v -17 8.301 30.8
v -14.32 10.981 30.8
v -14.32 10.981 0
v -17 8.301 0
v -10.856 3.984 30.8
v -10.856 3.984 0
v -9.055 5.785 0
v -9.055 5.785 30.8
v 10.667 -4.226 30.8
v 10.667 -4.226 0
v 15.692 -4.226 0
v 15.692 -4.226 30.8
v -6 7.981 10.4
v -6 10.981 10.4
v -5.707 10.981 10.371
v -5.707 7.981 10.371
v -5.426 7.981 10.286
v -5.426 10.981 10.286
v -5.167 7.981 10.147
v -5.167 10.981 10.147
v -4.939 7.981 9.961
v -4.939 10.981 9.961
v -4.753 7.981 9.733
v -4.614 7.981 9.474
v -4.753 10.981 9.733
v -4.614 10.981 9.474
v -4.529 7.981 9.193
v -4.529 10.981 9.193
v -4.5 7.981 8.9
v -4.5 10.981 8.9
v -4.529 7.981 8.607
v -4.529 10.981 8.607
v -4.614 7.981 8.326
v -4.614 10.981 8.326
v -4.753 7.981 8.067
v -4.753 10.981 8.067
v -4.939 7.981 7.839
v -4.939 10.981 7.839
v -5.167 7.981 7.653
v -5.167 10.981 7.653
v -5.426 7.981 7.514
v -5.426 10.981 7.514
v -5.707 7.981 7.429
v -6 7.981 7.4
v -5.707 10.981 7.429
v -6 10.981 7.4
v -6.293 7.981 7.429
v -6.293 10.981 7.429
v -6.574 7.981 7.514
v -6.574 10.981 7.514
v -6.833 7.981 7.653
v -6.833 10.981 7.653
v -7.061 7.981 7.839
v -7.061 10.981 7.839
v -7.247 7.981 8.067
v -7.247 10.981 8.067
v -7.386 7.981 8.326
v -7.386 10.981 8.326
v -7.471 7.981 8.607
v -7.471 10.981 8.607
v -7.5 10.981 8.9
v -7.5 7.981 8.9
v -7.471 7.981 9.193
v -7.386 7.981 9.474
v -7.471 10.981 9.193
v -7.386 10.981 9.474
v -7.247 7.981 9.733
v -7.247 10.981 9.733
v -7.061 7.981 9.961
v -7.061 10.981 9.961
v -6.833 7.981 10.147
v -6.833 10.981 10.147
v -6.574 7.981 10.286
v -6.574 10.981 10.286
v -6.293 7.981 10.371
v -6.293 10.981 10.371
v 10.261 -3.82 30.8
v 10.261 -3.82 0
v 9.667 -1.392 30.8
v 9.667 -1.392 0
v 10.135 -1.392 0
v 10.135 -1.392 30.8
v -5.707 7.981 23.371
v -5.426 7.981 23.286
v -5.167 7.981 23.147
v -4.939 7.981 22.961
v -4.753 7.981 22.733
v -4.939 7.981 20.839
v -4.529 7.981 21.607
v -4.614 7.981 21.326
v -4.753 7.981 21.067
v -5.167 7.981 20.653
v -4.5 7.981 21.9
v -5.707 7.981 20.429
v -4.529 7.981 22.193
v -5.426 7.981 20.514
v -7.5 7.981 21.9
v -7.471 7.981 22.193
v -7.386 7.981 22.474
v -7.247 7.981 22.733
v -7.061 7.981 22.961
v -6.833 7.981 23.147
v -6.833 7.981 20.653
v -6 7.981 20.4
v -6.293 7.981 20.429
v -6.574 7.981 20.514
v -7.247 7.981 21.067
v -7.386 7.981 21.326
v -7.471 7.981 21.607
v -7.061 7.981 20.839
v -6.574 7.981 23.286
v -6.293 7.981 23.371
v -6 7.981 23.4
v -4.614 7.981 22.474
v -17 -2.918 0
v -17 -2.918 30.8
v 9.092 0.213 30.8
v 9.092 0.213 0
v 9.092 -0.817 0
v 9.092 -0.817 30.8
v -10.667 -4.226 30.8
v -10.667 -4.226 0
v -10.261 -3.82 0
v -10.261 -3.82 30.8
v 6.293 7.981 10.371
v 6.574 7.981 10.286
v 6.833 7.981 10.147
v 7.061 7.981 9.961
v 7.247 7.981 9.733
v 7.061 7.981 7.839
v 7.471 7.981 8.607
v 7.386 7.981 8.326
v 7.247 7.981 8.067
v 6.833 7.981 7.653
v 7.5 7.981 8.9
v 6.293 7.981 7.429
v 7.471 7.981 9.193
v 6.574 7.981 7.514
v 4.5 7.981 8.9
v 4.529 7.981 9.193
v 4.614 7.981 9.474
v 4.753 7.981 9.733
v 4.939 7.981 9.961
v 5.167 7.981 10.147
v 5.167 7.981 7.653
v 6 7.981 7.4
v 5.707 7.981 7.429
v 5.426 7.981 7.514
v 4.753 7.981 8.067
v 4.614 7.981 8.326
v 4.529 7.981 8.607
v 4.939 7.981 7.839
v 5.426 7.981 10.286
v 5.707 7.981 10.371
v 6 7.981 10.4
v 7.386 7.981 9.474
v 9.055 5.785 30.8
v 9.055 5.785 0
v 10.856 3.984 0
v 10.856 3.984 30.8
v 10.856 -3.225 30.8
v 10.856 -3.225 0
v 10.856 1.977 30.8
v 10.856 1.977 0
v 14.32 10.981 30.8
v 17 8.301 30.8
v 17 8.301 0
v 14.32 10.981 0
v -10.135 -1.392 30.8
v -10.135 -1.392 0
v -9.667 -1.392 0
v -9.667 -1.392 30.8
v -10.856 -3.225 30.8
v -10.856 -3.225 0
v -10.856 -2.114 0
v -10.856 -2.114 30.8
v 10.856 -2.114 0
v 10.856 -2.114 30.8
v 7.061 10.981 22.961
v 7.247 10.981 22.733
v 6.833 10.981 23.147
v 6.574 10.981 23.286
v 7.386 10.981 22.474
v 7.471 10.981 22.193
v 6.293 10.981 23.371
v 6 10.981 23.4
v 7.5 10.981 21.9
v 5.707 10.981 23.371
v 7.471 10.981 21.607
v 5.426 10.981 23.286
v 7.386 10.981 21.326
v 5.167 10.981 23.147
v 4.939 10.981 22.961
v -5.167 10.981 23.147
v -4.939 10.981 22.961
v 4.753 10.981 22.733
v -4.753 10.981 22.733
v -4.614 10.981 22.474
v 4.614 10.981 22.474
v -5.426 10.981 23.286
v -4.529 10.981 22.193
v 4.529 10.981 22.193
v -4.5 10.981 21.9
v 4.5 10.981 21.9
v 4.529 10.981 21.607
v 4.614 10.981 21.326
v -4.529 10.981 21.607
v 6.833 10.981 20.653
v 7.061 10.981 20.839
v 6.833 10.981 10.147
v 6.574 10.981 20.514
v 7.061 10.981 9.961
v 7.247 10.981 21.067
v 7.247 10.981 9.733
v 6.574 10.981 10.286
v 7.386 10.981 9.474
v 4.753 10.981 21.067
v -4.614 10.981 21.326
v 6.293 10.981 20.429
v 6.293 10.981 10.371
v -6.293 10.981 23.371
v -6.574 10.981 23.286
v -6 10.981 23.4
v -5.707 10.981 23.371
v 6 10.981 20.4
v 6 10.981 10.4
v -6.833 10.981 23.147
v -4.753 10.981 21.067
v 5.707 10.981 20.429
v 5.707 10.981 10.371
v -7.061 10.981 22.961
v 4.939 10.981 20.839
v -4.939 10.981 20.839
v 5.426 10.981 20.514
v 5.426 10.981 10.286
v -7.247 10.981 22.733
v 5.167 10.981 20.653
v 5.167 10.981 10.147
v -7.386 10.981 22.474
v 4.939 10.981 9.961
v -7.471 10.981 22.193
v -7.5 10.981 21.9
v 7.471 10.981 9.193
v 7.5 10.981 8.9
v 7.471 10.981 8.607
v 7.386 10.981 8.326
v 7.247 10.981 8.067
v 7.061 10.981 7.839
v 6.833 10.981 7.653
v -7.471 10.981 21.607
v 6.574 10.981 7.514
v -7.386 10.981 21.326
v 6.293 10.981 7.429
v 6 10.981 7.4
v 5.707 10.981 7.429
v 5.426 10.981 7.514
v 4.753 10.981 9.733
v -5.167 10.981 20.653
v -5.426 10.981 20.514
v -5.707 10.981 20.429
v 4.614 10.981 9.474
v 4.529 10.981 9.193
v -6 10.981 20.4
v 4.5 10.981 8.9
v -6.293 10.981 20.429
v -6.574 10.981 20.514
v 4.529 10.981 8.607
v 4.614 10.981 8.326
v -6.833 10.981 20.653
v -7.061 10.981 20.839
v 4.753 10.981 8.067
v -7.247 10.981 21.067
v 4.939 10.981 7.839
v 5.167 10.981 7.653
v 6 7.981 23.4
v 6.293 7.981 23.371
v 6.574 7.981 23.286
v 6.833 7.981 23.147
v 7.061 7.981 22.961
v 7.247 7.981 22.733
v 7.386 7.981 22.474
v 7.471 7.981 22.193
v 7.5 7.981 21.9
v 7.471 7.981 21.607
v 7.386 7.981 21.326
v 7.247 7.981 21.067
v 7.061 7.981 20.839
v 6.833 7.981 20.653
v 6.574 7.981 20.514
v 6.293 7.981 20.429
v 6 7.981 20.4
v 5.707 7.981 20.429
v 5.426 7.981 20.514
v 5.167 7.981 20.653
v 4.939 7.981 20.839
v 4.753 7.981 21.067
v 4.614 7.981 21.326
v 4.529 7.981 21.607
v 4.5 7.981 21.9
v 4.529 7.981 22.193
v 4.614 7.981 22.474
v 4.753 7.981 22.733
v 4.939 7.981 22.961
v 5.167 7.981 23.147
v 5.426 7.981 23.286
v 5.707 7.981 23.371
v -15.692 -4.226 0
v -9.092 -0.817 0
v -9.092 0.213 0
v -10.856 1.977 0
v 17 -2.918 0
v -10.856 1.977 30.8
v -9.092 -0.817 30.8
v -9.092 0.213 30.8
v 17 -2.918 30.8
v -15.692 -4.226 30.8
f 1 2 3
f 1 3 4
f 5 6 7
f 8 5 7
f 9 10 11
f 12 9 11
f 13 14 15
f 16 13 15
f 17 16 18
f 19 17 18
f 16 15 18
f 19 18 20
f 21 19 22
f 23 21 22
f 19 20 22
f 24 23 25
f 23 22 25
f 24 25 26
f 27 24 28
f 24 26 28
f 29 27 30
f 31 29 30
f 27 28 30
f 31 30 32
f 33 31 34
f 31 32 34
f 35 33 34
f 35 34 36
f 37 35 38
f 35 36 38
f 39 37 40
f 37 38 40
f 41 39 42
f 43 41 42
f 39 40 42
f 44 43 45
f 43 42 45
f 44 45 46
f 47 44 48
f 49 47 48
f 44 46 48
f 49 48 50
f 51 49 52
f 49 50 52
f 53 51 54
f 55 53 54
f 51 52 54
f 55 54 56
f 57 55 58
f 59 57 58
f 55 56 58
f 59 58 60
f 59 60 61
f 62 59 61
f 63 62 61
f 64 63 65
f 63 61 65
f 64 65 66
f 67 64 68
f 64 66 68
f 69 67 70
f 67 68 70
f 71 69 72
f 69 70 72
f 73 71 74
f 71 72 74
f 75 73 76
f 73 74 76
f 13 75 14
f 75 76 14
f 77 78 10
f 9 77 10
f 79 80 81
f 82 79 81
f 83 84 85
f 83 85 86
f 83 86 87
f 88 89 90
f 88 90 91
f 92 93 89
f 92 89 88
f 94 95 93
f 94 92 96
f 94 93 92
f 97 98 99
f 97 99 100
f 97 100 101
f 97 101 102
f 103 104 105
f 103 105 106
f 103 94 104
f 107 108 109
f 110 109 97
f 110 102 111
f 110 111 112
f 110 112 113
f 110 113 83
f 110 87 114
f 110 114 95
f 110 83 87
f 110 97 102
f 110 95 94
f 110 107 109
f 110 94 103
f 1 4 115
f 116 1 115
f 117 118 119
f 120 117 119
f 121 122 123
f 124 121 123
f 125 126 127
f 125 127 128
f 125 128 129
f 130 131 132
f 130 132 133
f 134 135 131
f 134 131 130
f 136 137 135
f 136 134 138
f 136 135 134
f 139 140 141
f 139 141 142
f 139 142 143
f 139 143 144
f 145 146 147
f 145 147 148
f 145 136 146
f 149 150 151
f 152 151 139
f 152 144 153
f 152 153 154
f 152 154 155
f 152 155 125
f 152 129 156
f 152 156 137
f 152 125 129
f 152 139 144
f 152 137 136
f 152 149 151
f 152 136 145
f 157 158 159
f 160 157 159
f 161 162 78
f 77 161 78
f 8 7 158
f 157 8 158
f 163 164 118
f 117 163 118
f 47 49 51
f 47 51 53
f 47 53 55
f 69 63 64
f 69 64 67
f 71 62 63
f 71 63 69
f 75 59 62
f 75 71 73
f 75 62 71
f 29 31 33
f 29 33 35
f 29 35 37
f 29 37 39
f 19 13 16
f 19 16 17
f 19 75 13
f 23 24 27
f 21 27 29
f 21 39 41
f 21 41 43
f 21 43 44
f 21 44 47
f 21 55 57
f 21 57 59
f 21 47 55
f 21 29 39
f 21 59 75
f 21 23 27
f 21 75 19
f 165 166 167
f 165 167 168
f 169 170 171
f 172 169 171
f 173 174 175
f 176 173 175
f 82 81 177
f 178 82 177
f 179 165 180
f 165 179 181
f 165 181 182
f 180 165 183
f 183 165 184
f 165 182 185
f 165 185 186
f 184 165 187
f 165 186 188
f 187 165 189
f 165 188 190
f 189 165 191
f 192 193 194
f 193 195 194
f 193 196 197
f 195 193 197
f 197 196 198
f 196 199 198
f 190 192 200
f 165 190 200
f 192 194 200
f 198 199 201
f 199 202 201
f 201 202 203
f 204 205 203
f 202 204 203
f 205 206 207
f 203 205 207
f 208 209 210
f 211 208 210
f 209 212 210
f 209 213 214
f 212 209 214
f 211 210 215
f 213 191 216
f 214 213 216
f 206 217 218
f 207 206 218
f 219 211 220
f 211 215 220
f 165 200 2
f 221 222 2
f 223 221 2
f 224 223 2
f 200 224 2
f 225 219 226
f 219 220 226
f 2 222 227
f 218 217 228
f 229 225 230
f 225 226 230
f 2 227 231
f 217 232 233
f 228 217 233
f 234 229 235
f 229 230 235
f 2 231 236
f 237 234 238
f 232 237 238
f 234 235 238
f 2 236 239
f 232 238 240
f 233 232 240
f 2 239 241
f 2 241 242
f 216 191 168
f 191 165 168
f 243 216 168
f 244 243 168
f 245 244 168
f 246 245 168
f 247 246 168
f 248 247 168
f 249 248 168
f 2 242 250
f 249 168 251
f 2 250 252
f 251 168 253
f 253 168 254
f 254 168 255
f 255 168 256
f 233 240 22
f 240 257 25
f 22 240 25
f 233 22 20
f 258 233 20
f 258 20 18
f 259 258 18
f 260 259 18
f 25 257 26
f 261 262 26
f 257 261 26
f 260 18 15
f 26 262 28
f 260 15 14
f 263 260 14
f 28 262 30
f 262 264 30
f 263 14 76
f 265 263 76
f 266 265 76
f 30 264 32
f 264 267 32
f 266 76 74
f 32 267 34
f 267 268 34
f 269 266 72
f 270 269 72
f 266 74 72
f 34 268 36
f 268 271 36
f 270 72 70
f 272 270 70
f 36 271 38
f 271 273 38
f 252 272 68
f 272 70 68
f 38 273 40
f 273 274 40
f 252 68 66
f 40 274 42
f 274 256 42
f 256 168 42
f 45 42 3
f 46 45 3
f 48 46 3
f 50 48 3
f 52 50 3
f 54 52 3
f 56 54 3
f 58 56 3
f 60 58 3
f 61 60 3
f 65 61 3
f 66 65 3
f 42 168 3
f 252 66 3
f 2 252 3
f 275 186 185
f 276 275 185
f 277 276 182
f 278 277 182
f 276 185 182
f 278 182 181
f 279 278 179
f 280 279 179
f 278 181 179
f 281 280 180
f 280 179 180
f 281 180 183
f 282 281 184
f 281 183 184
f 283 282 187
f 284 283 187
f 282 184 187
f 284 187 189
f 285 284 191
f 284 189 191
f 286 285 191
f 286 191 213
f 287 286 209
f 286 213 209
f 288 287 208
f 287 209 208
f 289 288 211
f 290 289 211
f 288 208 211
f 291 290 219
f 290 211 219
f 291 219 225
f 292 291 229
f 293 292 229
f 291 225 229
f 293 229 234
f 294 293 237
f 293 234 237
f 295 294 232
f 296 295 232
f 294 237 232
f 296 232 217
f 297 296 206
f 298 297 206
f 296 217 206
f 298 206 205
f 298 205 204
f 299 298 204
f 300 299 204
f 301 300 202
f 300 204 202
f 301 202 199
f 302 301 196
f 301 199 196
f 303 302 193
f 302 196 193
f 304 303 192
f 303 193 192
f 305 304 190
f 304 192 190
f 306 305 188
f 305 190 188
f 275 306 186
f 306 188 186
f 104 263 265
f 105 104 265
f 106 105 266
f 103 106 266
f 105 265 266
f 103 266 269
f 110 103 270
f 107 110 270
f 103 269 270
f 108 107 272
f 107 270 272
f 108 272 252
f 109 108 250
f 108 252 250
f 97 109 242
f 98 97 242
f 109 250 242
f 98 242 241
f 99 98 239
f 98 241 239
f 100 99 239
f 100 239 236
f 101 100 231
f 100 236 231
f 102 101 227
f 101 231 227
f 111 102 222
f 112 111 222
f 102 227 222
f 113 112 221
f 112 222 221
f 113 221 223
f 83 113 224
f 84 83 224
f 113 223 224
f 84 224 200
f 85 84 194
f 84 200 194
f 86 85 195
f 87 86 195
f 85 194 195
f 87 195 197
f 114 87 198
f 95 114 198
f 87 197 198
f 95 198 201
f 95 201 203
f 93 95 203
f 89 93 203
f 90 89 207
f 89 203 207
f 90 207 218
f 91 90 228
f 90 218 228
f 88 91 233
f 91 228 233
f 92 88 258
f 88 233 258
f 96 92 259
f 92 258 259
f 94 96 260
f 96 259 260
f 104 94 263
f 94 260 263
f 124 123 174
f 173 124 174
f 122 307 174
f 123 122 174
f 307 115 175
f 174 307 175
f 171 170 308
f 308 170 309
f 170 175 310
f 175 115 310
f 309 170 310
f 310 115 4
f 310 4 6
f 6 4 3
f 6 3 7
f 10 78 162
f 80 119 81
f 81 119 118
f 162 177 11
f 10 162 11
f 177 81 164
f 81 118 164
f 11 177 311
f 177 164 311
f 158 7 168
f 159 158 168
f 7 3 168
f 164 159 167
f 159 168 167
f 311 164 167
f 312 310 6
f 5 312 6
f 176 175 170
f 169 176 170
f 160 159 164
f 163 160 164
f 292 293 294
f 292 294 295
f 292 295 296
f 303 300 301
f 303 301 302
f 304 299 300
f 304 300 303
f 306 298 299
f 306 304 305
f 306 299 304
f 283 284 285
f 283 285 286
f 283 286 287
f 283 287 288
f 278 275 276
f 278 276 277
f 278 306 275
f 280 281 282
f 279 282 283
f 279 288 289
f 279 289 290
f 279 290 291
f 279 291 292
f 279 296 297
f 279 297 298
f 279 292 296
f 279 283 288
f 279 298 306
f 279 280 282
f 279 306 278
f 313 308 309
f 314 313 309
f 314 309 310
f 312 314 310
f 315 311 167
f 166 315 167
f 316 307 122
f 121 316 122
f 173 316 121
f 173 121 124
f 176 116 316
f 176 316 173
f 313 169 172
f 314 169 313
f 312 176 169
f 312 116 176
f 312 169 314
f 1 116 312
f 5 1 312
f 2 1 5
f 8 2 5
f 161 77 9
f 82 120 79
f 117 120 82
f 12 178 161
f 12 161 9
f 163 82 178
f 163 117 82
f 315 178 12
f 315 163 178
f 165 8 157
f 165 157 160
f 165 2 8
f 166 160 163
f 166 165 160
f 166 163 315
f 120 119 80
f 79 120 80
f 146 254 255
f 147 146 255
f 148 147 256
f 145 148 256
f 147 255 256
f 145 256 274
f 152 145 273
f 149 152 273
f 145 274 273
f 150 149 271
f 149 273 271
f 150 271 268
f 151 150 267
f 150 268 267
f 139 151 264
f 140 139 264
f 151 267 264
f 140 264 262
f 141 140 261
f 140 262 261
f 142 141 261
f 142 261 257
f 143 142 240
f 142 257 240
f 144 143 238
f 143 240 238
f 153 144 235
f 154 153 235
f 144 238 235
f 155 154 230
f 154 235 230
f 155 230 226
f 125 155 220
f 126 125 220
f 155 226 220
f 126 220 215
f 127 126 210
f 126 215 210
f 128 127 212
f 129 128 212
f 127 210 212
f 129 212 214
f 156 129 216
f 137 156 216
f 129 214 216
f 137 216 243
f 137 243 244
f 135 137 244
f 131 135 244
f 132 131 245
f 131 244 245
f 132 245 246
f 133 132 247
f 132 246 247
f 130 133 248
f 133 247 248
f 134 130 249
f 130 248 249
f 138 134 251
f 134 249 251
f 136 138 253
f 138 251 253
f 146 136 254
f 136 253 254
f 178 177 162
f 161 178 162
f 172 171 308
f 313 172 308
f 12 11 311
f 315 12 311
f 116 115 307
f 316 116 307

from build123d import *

# Parameters (mm, degrees)
BOSS_EXTRUDE1_DEPTH = 30.8
SKETCH2_R           = 1.5
CUT_EXTRUDE1_DEPTH  = 3


with BuildPart() as part:
    # Sketch1 → Boss-Extrude1 (new body)
    with BuildSketch(Plane.XY):
        Polygon((-9.054919228, 5.785059654), (9.054919228, 5.785059654), (10.856146045, 3.983832837), (10.856146045, 1.977204652), (9.091867013, 0.21292562), (9.091867013, -0.817284255), (9.66657341, -1.391990652), (10.13460575, -1.391990652), (10.856146045, -2.113530947), (10.856146045, -3.22536771), (10.261359727, -3.820154028), (10.666709383, -4.225503683), (15.692371673, -4.225503683), (17, -2.917875356), (17, 8.301296502), (14.320116844, 10.981179658), (-14.320116844, 10.981179658), (-17, 8.301296502), (-17, -2.917875356), (-15.692371673, -4.225503683), (-10.666709383, -4.225503683), (-10.261359727, -3.820154028), (-10.856146045, -3.22536771), (-10.856146045, -2.113530947), (-10.13460575, -1.391990652), (-9.66657341, -1.391990652), (-9.091867013, -0.817284255), (-9.091867013, 0.21292562), (-10.856146045, 1.977204652), (-10.856146045, 3.983832837), align=None)
    extrude(amount=BOSS_EXTRUDE1_DEPTH)

    # Sketch2 → Cut-Extrude1 (cut)
    with BuildSketch(Plane(origin=(0, 10.981179658, 0), x_dir=(1, 0, 0), z_dir=(0, 1, 0))):
        with Locations(Location((-6, -8.9, 0), (0, 0, 270))):
            Circle(SKETCH2_R)
        with Locations(Location((6, -8.9, 0), (0, 0, 90))):
            Circle(SKETCH2_R)
        with Locations(Location((6, -21.9, 0), (0, 0, 270))):
            Circle(SKETCH2_R)
        with Locations(Location((-6, -21.9, 0), (0, 0, 90))):
            Circle(SKETCH2_R)
    extrude(amount=-CUT_EXTRUDE1_DEPTH, mode=Mode.SUBTRACT)


solid = part.part
